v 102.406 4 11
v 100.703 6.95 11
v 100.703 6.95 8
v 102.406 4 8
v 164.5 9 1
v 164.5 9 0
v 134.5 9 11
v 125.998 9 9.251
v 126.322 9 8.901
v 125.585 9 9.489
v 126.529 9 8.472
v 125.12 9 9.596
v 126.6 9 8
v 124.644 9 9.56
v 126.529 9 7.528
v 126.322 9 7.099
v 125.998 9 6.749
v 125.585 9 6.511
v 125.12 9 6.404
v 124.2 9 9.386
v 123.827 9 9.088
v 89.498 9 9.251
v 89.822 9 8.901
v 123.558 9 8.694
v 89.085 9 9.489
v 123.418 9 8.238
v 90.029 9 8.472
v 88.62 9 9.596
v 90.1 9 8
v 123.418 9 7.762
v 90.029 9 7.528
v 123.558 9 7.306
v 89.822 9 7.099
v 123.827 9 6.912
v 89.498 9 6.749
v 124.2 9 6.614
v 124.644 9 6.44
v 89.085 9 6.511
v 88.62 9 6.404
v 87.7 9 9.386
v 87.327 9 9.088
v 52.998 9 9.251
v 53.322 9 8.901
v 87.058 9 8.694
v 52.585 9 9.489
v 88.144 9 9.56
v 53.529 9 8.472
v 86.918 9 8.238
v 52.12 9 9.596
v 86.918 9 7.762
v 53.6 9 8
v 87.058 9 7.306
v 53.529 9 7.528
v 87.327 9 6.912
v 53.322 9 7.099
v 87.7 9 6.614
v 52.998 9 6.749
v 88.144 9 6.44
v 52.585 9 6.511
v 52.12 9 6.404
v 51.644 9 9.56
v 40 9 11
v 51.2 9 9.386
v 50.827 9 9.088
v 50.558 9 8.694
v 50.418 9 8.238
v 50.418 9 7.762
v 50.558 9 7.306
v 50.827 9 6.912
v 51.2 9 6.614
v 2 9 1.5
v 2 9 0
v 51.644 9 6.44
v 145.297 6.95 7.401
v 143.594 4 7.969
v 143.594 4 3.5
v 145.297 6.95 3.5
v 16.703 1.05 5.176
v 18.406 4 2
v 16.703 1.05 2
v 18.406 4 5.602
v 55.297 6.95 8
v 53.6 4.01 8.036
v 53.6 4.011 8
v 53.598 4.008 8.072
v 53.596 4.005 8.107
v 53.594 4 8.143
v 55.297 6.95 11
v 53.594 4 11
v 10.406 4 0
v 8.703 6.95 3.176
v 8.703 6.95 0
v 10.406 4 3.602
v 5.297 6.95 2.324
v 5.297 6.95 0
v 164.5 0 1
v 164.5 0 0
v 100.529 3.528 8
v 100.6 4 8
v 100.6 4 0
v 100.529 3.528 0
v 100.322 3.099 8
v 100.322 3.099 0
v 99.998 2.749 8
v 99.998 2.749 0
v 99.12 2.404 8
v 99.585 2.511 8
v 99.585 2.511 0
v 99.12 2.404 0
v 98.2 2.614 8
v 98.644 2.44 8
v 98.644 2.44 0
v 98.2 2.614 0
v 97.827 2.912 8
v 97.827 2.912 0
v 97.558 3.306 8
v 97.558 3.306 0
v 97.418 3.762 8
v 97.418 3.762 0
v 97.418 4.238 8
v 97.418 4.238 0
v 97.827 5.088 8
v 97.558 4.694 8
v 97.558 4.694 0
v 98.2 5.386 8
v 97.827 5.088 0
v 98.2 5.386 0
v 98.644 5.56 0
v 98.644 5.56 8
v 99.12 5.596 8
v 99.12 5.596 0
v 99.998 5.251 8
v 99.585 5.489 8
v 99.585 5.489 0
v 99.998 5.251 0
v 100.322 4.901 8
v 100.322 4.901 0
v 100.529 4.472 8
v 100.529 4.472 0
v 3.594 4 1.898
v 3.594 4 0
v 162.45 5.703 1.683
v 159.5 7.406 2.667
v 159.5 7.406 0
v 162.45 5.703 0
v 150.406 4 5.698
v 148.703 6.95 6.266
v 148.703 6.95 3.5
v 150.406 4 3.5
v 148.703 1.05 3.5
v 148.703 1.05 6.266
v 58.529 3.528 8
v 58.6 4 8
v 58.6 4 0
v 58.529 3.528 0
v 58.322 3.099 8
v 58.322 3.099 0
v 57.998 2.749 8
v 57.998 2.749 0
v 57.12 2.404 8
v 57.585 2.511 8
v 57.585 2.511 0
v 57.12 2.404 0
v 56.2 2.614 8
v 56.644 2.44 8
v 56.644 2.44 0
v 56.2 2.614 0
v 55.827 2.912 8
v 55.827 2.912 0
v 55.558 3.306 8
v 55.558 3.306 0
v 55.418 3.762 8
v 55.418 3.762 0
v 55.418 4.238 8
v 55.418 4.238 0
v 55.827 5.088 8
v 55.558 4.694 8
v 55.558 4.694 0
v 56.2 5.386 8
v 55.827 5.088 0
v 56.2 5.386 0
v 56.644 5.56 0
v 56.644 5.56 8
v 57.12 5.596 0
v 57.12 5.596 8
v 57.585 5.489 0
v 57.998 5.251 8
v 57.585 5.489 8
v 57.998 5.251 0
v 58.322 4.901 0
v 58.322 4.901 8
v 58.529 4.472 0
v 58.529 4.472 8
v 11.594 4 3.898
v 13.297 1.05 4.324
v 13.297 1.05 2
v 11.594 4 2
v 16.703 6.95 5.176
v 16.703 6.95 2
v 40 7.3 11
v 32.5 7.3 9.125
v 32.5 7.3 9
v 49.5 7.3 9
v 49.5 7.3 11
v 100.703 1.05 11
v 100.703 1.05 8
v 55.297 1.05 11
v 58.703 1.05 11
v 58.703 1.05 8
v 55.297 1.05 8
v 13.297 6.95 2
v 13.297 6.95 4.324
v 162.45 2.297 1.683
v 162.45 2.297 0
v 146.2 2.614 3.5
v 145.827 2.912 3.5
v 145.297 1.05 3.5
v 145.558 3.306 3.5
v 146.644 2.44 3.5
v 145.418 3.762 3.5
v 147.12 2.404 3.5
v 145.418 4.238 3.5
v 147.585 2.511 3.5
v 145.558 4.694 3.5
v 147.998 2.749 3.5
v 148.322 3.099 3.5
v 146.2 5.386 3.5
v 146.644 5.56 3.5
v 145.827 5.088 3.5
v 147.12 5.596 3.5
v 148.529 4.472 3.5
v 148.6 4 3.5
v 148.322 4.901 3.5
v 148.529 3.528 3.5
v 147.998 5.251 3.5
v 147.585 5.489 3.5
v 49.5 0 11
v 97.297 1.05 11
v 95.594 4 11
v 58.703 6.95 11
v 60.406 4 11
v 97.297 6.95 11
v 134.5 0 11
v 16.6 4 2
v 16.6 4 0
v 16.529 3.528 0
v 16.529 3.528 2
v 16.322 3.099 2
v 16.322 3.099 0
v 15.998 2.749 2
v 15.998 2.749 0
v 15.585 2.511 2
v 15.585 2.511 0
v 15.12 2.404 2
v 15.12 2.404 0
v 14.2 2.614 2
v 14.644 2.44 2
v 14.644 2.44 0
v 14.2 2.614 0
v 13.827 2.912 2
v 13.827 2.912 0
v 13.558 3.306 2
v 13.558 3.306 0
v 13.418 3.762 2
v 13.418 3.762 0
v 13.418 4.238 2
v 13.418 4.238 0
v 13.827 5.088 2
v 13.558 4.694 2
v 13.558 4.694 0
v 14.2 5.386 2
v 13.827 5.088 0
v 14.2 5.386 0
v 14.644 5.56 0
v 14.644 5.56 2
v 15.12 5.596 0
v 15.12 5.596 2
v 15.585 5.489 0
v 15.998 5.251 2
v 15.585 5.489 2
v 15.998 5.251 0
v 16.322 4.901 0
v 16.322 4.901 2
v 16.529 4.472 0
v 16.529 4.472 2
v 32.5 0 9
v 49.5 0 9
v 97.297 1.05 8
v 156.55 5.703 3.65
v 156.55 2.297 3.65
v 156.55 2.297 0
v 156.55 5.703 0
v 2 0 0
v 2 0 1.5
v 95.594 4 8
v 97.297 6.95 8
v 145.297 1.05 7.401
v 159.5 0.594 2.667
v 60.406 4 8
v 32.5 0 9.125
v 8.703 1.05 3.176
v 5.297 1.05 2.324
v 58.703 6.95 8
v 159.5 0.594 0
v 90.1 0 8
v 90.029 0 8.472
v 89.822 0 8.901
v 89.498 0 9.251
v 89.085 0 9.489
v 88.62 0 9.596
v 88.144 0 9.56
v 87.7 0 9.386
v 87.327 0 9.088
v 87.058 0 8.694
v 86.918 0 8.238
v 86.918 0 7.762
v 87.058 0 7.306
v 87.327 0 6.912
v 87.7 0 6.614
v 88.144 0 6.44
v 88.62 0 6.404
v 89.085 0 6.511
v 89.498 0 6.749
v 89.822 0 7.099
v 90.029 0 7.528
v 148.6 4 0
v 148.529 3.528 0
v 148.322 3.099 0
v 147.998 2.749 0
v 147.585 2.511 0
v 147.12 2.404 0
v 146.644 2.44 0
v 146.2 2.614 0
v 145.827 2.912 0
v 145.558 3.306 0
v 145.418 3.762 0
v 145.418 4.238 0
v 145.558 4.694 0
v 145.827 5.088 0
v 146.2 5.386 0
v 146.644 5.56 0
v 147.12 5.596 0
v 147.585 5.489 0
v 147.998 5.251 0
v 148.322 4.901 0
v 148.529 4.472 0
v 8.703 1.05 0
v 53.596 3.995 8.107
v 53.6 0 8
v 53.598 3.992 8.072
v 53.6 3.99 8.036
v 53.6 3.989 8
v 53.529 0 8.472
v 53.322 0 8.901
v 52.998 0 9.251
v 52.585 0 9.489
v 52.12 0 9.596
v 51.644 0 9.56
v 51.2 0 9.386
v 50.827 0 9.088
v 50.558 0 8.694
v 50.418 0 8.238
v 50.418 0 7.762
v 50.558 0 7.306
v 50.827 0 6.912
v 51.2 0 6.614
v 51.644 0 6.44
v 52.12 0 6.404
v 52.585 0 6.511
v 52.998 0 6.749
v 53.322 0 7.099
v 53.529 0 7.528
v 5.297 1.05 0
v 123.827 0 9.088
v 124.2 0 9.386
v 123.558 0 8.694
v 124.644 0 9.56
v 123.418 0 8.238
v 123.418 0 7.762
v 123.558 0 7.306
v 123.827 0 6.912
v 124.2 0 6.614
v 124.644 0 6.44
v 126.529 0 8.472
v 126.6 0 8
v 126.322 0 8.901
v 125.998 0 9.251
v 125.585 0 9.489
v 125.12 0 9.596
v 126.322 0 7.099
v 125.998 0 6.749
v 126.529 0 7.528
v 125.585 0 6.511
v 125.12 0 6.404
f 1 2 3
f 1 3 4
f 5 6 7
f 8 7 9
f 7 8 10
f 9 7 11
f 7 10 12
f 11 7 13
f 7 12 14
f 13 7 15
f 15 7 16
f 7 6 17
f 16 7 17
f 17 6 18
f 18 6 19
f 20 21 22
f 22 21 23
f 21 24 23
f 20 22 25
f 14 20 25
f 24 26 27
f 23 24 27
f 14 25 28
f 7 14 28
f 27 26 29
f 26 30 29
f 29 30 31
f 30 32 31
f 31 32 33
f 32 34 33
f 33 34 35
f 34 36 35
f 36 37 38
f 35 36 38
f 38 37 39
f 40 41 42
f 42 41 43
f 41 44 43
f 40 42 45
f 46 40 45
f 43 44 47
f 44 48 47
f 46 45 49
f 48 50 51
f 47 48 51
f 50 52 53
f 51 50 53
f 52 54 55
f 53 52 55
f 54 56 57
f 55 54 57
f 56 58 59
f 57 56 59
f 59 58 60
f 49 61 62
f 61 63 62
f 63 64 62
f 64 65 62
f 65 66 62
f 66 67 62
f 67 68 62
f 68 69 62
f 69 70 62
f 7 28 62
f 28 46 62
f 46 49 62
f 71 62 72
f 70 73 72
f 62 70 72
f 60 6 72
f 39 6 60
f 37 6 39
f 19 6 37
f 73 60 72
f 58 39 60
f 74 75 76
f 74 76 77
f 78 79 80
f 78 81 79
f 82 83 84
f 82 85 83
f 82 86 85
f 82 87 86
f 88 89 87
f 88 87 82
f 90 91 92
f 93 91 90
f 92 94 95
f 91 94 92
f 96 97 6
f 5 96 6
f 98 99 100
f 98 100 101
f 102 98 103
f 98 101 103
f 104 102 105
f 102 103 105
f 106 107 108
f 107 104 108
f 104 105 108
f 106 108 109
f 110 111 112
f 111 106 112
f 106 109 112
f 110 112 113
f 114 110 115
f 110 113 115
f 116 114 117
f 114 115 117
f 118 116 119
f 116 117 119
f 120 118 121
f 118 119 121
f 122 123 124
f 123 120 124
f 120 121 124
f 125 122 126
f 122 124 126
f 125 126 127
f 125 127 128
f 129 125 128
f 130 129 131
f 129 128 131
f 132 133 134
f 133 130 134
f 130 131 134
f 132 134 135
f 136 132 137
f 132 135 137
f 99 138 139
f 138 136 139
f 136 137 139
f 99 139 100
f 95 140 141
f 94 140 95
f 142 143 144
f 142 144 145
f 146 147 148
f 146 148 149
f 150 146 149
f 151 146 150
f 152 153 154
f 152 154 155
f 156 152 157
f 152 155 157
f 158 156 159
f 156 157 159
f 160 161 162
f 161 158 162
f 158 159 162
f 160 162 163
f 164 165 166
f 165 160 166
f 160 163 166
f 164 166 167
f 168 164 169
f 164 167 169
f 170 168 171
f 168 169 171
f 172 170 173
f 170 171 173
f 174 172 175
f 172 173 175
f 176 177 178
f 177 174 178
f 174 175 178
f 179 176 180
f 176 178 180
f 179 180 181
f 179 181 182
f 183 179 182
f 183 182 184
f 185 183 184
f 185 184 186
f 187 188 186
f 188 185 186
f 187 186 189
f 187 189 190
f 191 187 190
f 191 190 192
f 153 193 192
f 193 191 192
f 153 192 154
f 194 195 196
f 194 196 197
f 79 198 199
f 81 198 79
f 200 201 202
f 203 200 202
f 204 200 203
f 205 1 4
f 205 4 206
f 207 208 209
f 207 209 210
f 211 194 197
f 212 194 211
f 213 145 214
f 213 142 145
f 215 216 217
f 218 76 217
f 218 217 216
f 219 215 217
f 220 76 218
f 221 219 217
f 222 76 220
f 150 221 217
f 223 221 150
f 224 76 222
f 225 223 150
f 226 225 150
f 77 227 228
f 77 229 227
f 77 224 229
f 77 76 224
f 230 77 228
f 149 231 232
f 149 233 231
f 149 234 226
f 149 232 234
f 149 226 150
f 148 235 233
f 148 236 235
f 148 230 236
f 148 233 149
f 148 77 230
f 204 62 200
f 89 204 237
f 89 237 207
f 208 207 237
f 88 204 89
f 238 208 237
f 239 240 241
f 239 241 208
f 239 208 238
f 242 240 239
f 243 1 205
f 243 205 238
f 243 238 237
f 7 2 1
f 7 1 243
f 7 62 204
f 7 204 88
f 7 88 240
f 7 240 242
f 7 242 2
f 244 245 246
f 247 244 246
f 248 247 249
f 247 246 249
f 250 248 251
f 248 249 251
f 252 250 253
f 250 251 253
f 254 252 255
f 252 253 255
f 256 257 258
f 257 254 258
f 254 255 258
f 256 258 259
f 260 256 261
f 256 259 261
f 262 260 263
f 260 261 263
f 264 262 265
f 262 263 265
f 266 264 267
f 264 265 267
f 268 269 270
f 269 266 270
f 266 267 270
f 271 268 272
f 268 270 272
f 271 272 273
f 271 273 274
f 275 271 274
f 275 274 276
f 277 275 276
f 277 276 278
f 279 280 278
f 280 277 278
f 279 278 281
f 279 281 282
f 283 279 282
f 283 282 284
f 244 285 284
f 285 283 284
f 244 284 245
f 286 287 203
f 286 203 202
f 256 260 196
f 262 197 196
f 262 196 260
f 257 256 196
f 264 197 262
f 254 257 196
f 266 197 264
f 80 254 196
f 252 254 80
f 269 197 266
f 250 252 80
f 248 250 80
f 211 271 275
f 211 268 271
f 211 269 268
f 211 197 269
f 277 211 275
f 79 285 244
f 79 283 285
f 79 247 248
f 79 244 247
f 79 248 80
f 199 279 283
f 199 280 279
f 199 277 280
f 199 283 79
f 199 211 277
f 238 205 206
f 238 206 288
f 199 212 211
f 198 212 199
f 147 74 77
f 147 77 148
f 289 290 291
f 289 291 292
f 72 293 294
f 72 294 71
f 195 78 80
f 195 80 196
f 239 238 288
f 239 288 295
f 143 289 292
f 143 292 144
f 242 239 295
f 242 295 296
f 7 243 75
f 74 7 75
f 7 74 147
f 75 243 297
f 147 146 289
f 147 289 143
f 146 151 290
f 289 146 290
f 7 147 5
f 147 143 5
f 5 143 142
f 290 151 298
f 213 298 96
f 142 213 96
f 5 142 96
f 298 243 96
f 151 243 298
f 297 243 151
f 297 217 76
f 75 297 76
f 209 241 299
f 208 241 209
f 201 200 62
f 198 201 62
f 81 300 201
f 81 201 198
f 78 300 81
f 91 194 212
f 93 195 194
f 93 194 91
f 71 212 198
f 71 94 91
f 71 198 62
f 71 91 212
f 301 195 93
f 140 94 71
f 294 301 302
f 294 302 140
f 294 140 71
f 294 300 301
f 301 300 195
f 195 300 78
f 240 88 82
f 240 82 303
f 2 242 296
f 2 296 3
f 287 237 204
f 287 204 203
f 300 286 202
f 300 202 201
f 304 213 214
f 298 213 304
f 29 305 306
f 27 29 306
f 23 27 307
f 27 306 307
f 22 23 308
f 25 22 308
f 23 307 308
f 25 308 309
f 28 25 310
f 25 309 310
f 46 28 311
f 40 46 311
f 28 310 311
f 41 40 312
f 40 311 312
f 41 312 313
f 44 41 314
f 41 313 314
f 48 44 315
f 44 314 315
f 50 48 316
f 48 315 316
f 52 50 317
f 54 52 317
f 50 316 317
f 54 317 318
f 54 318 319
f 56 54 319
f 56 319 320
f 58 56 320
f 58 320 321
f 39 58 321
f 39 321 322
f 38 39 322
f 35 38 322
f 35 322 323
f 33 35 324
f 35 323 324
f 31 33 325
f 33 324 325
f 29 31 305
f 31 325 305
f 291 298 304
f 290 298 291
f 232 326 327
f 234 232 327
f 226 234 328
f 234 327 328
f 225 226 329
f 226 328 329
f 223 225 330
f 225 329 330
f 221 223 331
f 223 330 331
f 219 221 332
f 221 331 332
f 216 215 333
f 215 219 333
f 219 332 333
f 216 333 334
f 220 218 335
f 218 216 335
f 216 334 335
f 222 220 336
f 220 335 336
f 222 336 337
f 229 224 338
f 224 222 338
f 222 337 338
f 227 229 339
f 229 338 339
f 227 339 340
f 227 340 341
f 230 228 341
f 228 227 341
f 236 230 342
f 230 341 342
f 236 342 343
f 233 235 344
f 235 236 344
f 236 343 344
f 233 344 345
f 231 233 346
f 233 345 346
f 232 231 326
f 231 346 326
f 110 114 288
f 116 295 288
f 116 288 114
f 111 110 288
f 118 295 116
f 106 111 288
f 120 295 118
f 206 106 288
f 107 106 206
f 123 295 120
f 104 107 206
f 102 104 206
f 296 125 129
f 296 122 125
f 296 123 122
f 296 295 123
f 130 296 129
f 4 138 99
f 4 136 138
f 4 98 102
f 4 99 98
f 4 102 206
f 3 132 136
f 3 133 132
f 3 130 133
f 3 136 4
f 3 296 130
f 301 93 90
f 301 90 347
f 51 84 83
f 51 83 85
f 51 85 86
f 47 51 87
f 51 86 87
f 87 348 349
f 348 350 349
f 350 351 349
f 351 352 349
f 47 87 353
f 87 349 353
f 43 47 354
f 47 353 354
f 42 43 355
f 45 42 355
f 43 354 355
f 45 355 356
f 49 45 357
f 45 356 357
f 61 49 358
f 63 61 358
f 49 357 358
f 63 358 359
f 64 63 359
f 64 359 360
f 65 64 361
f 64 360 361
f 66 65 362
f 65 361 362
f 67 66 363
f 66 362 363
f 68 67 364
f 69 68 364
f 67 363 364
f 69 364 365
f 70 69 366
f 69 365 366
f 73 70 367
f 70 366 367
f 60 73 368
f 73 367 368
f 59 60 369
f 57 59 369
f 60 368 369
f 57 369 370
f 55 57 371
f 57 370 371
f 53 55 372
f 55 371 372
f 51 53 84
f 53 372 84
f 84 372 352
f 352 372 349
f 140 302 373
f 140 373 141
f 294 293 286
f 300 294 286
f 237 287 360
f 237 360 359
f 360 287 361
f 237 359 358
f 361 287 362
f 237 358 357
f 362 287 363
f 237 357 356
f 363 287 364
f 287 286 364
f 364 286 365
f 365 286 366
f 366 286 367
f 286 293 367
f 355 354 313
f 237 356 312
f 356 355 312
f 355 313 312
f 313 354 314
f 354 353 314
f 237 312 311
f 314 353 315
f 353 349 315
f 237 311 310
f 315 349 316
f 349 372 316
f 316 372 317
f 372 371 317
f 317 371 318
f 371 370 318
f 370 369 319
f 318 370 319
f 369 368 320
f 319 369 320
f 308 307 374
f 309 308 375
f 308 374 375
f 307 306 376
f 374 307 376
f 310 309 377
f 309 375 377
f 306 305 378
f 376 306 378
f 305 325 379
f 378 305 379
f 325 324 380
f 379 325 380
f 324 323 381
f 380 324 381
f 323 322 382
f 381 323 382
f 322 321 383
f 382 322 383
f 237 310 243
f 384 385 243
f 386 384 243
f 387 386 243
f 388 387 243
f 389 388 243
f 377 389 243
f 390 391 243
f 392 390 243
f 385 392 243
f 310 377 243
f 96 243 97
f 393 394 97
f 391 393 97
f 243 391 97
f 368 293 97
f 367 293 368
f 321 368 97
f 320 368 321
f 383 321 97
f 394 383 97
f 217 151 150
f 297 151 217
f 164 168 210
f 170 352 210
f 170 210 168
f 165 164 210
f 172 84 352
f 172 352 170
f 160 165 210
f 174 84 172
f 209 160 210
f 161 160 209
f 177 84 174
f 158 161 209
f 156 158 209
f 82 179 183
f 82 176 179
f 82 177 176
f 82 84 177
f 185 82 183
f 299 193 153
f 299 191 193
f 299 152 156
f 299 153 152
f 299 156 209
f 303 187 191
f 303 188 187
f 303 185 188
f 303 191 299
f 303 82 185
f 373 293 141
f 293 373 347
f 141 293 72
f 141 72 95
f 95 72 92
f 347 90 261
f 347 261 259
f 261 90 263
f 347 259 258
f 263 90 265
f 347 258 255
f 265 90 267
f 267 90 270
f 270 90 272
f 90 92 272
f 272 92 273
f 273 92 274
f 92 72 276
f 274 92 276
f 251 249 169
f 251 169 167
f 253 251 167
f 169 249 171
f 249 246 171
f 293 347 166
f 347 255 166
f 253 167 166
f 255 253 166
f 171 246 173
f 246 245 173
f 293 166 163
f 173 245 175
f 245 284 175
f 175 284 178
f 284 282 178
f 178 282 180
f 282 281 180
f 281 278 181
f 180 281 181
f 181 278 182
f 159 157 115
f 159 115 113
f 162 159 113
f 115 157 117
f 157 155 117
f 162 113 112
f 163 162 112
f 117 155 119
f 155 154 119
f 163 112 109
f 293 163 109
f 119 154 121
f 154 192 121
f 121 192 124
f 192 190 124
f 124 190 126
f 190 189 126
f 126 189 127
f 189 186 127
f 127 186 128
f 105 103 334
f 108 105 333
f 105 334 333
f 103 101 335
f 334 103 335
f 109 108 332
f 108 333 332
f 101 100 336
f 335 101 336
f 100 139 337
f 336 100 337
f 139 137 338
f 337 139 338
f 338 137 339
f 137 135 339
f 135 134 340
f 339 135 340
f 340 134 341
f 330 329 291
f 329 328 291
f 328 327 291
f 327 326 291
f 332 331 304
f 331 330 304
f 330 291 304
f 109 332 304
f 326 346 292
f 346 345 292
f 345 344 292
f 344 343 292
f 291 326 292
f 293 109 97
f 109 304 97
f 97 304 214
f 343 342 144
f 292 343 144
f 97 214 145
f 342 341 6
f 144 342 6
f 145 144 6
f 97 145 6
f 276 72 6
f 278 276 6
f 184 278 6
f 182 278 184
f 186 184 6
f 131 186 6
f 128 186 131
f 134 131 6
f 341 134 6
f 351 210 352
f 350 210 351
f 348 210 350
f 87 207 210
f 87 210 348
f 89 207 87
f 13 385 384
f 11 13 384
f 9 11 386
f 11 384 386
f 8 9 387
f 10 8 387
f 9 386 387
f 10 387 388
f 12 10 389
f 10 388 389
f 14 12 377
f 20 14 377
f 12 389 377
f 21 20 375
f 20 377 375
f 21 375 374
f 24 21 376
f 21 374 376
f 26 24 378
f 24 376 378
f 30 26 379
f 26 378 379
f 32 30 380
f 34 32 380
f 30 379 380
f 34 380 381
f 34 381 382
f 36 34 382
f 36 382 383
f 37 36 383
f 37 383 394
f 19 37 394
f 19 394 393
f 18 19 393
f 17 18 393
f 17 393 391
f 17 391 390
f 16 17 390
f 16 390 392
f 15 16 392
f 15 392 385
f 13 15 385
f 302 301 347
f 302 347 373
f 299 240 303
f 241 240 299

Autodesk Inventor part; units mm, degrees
ref_plane "YZ Plane" through (0, 0, 0) normal (1, 0, 0) x (0, 1, 0)
ref_plane "XZ Plane" through (0, 0, 0) normal (0, 1, 0) x (-1, 0, 0)
ref_plane "XY Plane" through (0, 0, 0) normal (0, 0, 1) x (1, 0, 0)
sketch "Sketch1" plane through (0, 0, 0) normal (0, 0, 1) x (1, 0, 0)
  line L0 (0, 0) -> (164.5, 0)
  line L1 (164.5, 0) -> (164.5, 9)
  line L2 (164.5, 9) -> (0, 9)
  line L3 (0, 9) -> (0, 0)
  circle A0 centre (57, 4) radius 1.6
  circle A1 centre (99, 4) radius 1.6
  circle A2 centre (159.5, 4) radius 1.6
  circle A3 centre (147, 4) radius 1.6
  circle A4 centre (15, 4) radius 1.6
  circle A5 centre (7, 4) radius 1.6
  dimension "d1" = 9
  dimension "d2" = 90
  dimension "d4" = 3.2
  dimension "d6" = 3.2
  dimension "d7" = 3.2
  dimension "d8" = 42
  dimension "d9" = 60.5
  dimension "d26" = 3.2
  dimension "d27" = 48
  dimension "d28" = 3.2
  dimension "d29" = 42
  dimension "d32" = 15
  dimension "d33" = 5
  dimension "d61" = 3.2
  dimension "d62" = 8
  dimension "d63" = 12.5
  dimension "d108" = 4
  dimension "d109" = 4
  dimension "d110" = 4
  dimension "d111" = 4
  dimension "d112" = 4
  dimension "d113" = 4
ref_plane "Work Plane2" through (0, 0, 0) normal (0, -1, 0) x (1, 0, 0)
sketch "Sketch2" plane through (0, 0, 0) normal (0, -1, 0) x (1, 0, 0)
  circle A0 centre (52, 8) radius 1.6
  circle A1 centre (125, 8) radius 1.6
  circle A2 centre (88.5, 8) radius 1.6
  point P0 (0, 0)
  point P1 (52, 0)
  dimension "d13" = 3.2
  dimension "d15" = 3.2
  dimension "d17" = 3.2
  dimension "d18" = 36.5
  dimension "d64" = 52
  dimension "d65" = 36.5
  dimension "d114" = 8
  dimension "d115" = 73
ref_plane "Work Plane1" through (0, 0, 11) normal (0, 0, 1) x (1, 0, 0)
extrude "klocek" add sketch "Sketch1" along normal blind 11
ref_plane "Work Plane3" through (0, 0, 0) normal (0, -1, 0) x (1, 0, 0)
extrude "prowadzenie osi" cut sketch "Sketch2" against normal up to next
ref_plane "Work Plane4" through (0, 0, 0) normal (0, -1, 0) x (1, 0, 0)
sketch "Sketch7" plane through (0, 0, 0) normal (0, -1, 0) x (1, 0, 0)
  line L0 (0, 11) -> (0, 1)
  line L1 (0, 11) -> (164.5, 11) projected
  line L2 (0, 11) -> (40, 11)
  line L3 (40, 11) -> (0, 1)
  point P0 (0, -1.8333)
  dimension "d86" = 10
  dimension "d87" = 40
sketch "Sketch8" plane through (0, 0, 0) normal (0, -1, 0) x (1, 0, 0)
  line L0 (164.5, 0) -> (164.5, 11) projected
  line L1 (164.5, 11) -> (164.5, 1)
  line L2 (164.5, 11) -> (0, 11) projected
  line L3 (164.5, 11) -> (134.5, 11)
  line L4 (134.5, 11) -> (164.5, 1)
  point P0 (0, 0)
  point P1 (40.8333, 11)
  dimension "d80" = 10
  dimension "d81" = 30
extrude "przedni skos" cut sketch "Sketch7" against normal up to next
extrude "tylni skos" cut sketch "Sketch8" against normal up to next
ref_plane "Work Plane7" through (0, 0, 11) normal (0, 0, 1) x (1, 0, 0)
sketch "Sketch5" plane through (0, 0, 11) normal (0, 0, 1) x (1, 0, 0)
  circle A0 centre (99, 4) radius 1.6 projected
  line L0 (95.5936, 4) -> (97.2968, 6.95)
  line L1 (97.2968, 6.95) -> (100.7032, 6.95)
  line L2 (100.7032, 6.95) -> (102.4064, 4)
  line L3 (102.4064, 4) -> (100.7032, 1.05)
  line L4 (100.7032, 1.05) -> (97.2968, 1.05)
  line L5 (97.2968, 1.05) -> (95.5936, 4)
  circle A1 centre (57, 4) radius 1.6 projected
  line L6 (60.4064, 4) -> (58.7032, 1.05)
  line L7 (58.7032, 1.05) -> (55.2968, 1.05)
  line L8 (55.2968, 1.05) -> (53.5936, 4)
  line L9 (53.5936, 4) -> (55.2968, 6.95)
  line L10 (55.2968, 6.95) -> (58.7032, 6.95)
  line L11 (58.7032, 6.95) -> (60.4064, 4)
  point P0 (119.5, 5)
  dimension "d98" = 5.9
  dimension "d100" = 5.9
extrude "hex insert middle" cut sketch "Sketch5" against normal blind 3
ref_plane "Work Plane6" through (0, 0, 11) normal (0, 0, 1) x (1, 0, 0)
sketch "Sketch9" plane through (0, 0, 11) normal (0, 0, 1) x (1, 0, 0)
  circle A0 centre (147, 4) radius 1.6 projected
  line L0 (150.4064, 4) -> (148.7032, 1.05)
  line L1 (148.7032, 1.05) -> (145.2968, 1.05)
  line L2 (145.2968, 1.05) -> (143.5936, 4)
  line L3 (143.5936, 4) -> (145.2968, 6.95)
  line L4 (145.2968, 6.95) -> (148.7032, 6.95)
  line L5 (148.7032, 6.95) -> (150.4064, 4)
  point P0 (0, 0)
  point P1 (153, 5)
  dimension "d99" = 5.9
extrude "hex insert rear 1" cut sketch "Sketch9" against normal blind 7.5
ref_plane "Work Plane5" through (0, 0, 11) normal (0, 0, 1) x (1, 0, 0)
sketch "Sketch10" plane through (0, 0, 11) normal (0, 0, 1) x (1, 0, 0)
  circle A0 centre (159.5, 4) radius 1.6 projected
  line L0 (162.45, 5.7032) -> (162.45, 2.2968)
  line L1 (162.45, 2.2968) -> (159.5, 0.5936)
  line L2 (159.5, 0.5936) -> (156.55, 2.2968)
  line L3 (156.55, 2.2968) -> (156.55, 5.7032)
  line L4 (156.55, 5.7032) -> (159.5, 7.4064)
  line L5 (159.5, 7.4064) -> (162.45, 5.7032)
  line L6 (164.5, 0) -> (134.5, 0) projected
  point P0 (0, 0)
  dimension "d118" = 5.9
extrude "hex insert rear 2" cut sketch "Sketch10" against normal up to next contours A0 | L0 L1 L2 L3 L4 L5
sketch "Sketch13" plane through (0, 0, 11) normal (0, 0, 1) x (1, 0, 0)
  circle A0 centre (7, 4) radius 1.6 projected
  line L0 (10.4064, 4) -> (8.7032, 1.05)
  line L1 (8.7032, 1.05) -> (5.2968, 1.05)
  line L2 (5.2968, 1.05) -> (3.5936, 4)
  line L3 (3.5936, 4) -> (5.2968, 6.95)
  line L4 (5.2968, 6.95) -> (8.7032, 6.95)
  line L5 (8.7032, 6.95) -> (10.4064, 4)
  dimension "d123" = 5.9
extrude "hex insert front 1" cut sketch "Sketch13" against normal through all
sketch "Sketch16" plane through (0, 0, 11) normal (0, 0, 1) x (1, 0, 0)
  circle A0 centre (15, 4) radius 1.6 projected
  line L0 (18.4064, 4) -> (16.7032, 1.05)
  line L1 (16.7032, 1.05) -> (13.2968, 1.05)
  line L2 (13.2968, 1.05) -> (11.5936, 4)
  line L3 (11.5936, 4) -> (13.2968, 6.95)
  line L4 (13.2968, 6.95) -> (16.7032, 6.95)
  line L5 (16.7032, 6.95) -> (18.4064, 4)
  point P0 (0, 0)
  dimension "d93" = 5.9
extrude "hex insert front 2" cut sketch "Sketch16" against normal blind 9
sketch "Sketch17" plane through (0, 0, 0) normal (0, 0, -1) x (-1, 0, 0)
  line L0 (-164.5, 9) -> (0, 9) projected
  line L1 (0, 0) -> (-2, 0)
  line L2 (-2, 0) -> (-2, 9)
  line L3 (-2, 9) -> (0, 9)
  line L4 (0, 9) -> (0, 0)
  dimension "d122" = 2
extrude "ciecie przod" cut sketch "Sketch17" against normal up to next
sketch "Sketch18" plane through (40, 0, 11) normal (0, -1, 0) x (1, 0, 0)
  line L0 (9.5, 0) -> (9.5, -2)
  line L1 (9.5, -2) -> (-7.5, -2)
  line L2 (-7.5, -2) -> (-7.5, 0)
  line L3 (-7.5, 0) -> (9.5, 0)
  line L4 (94.5, 0) -> (0, 0) projected
  circle A0 centre (12, -3) radius 1.6 projected
  line L5 (-40, -11) -> (124.5, -11) projected
  point P0 (-35, -11)
  dimension "d102" = 2
  dimension "d103" = 17
  dimension "d104" = 2.5
extrude "sensor linii" cut sketch "Sketch18" against normal blind 7.3 contours L0 L1 L2 L3
properties part number "wheel_support_v4_narrow_with_line_sensor_all_holes"
